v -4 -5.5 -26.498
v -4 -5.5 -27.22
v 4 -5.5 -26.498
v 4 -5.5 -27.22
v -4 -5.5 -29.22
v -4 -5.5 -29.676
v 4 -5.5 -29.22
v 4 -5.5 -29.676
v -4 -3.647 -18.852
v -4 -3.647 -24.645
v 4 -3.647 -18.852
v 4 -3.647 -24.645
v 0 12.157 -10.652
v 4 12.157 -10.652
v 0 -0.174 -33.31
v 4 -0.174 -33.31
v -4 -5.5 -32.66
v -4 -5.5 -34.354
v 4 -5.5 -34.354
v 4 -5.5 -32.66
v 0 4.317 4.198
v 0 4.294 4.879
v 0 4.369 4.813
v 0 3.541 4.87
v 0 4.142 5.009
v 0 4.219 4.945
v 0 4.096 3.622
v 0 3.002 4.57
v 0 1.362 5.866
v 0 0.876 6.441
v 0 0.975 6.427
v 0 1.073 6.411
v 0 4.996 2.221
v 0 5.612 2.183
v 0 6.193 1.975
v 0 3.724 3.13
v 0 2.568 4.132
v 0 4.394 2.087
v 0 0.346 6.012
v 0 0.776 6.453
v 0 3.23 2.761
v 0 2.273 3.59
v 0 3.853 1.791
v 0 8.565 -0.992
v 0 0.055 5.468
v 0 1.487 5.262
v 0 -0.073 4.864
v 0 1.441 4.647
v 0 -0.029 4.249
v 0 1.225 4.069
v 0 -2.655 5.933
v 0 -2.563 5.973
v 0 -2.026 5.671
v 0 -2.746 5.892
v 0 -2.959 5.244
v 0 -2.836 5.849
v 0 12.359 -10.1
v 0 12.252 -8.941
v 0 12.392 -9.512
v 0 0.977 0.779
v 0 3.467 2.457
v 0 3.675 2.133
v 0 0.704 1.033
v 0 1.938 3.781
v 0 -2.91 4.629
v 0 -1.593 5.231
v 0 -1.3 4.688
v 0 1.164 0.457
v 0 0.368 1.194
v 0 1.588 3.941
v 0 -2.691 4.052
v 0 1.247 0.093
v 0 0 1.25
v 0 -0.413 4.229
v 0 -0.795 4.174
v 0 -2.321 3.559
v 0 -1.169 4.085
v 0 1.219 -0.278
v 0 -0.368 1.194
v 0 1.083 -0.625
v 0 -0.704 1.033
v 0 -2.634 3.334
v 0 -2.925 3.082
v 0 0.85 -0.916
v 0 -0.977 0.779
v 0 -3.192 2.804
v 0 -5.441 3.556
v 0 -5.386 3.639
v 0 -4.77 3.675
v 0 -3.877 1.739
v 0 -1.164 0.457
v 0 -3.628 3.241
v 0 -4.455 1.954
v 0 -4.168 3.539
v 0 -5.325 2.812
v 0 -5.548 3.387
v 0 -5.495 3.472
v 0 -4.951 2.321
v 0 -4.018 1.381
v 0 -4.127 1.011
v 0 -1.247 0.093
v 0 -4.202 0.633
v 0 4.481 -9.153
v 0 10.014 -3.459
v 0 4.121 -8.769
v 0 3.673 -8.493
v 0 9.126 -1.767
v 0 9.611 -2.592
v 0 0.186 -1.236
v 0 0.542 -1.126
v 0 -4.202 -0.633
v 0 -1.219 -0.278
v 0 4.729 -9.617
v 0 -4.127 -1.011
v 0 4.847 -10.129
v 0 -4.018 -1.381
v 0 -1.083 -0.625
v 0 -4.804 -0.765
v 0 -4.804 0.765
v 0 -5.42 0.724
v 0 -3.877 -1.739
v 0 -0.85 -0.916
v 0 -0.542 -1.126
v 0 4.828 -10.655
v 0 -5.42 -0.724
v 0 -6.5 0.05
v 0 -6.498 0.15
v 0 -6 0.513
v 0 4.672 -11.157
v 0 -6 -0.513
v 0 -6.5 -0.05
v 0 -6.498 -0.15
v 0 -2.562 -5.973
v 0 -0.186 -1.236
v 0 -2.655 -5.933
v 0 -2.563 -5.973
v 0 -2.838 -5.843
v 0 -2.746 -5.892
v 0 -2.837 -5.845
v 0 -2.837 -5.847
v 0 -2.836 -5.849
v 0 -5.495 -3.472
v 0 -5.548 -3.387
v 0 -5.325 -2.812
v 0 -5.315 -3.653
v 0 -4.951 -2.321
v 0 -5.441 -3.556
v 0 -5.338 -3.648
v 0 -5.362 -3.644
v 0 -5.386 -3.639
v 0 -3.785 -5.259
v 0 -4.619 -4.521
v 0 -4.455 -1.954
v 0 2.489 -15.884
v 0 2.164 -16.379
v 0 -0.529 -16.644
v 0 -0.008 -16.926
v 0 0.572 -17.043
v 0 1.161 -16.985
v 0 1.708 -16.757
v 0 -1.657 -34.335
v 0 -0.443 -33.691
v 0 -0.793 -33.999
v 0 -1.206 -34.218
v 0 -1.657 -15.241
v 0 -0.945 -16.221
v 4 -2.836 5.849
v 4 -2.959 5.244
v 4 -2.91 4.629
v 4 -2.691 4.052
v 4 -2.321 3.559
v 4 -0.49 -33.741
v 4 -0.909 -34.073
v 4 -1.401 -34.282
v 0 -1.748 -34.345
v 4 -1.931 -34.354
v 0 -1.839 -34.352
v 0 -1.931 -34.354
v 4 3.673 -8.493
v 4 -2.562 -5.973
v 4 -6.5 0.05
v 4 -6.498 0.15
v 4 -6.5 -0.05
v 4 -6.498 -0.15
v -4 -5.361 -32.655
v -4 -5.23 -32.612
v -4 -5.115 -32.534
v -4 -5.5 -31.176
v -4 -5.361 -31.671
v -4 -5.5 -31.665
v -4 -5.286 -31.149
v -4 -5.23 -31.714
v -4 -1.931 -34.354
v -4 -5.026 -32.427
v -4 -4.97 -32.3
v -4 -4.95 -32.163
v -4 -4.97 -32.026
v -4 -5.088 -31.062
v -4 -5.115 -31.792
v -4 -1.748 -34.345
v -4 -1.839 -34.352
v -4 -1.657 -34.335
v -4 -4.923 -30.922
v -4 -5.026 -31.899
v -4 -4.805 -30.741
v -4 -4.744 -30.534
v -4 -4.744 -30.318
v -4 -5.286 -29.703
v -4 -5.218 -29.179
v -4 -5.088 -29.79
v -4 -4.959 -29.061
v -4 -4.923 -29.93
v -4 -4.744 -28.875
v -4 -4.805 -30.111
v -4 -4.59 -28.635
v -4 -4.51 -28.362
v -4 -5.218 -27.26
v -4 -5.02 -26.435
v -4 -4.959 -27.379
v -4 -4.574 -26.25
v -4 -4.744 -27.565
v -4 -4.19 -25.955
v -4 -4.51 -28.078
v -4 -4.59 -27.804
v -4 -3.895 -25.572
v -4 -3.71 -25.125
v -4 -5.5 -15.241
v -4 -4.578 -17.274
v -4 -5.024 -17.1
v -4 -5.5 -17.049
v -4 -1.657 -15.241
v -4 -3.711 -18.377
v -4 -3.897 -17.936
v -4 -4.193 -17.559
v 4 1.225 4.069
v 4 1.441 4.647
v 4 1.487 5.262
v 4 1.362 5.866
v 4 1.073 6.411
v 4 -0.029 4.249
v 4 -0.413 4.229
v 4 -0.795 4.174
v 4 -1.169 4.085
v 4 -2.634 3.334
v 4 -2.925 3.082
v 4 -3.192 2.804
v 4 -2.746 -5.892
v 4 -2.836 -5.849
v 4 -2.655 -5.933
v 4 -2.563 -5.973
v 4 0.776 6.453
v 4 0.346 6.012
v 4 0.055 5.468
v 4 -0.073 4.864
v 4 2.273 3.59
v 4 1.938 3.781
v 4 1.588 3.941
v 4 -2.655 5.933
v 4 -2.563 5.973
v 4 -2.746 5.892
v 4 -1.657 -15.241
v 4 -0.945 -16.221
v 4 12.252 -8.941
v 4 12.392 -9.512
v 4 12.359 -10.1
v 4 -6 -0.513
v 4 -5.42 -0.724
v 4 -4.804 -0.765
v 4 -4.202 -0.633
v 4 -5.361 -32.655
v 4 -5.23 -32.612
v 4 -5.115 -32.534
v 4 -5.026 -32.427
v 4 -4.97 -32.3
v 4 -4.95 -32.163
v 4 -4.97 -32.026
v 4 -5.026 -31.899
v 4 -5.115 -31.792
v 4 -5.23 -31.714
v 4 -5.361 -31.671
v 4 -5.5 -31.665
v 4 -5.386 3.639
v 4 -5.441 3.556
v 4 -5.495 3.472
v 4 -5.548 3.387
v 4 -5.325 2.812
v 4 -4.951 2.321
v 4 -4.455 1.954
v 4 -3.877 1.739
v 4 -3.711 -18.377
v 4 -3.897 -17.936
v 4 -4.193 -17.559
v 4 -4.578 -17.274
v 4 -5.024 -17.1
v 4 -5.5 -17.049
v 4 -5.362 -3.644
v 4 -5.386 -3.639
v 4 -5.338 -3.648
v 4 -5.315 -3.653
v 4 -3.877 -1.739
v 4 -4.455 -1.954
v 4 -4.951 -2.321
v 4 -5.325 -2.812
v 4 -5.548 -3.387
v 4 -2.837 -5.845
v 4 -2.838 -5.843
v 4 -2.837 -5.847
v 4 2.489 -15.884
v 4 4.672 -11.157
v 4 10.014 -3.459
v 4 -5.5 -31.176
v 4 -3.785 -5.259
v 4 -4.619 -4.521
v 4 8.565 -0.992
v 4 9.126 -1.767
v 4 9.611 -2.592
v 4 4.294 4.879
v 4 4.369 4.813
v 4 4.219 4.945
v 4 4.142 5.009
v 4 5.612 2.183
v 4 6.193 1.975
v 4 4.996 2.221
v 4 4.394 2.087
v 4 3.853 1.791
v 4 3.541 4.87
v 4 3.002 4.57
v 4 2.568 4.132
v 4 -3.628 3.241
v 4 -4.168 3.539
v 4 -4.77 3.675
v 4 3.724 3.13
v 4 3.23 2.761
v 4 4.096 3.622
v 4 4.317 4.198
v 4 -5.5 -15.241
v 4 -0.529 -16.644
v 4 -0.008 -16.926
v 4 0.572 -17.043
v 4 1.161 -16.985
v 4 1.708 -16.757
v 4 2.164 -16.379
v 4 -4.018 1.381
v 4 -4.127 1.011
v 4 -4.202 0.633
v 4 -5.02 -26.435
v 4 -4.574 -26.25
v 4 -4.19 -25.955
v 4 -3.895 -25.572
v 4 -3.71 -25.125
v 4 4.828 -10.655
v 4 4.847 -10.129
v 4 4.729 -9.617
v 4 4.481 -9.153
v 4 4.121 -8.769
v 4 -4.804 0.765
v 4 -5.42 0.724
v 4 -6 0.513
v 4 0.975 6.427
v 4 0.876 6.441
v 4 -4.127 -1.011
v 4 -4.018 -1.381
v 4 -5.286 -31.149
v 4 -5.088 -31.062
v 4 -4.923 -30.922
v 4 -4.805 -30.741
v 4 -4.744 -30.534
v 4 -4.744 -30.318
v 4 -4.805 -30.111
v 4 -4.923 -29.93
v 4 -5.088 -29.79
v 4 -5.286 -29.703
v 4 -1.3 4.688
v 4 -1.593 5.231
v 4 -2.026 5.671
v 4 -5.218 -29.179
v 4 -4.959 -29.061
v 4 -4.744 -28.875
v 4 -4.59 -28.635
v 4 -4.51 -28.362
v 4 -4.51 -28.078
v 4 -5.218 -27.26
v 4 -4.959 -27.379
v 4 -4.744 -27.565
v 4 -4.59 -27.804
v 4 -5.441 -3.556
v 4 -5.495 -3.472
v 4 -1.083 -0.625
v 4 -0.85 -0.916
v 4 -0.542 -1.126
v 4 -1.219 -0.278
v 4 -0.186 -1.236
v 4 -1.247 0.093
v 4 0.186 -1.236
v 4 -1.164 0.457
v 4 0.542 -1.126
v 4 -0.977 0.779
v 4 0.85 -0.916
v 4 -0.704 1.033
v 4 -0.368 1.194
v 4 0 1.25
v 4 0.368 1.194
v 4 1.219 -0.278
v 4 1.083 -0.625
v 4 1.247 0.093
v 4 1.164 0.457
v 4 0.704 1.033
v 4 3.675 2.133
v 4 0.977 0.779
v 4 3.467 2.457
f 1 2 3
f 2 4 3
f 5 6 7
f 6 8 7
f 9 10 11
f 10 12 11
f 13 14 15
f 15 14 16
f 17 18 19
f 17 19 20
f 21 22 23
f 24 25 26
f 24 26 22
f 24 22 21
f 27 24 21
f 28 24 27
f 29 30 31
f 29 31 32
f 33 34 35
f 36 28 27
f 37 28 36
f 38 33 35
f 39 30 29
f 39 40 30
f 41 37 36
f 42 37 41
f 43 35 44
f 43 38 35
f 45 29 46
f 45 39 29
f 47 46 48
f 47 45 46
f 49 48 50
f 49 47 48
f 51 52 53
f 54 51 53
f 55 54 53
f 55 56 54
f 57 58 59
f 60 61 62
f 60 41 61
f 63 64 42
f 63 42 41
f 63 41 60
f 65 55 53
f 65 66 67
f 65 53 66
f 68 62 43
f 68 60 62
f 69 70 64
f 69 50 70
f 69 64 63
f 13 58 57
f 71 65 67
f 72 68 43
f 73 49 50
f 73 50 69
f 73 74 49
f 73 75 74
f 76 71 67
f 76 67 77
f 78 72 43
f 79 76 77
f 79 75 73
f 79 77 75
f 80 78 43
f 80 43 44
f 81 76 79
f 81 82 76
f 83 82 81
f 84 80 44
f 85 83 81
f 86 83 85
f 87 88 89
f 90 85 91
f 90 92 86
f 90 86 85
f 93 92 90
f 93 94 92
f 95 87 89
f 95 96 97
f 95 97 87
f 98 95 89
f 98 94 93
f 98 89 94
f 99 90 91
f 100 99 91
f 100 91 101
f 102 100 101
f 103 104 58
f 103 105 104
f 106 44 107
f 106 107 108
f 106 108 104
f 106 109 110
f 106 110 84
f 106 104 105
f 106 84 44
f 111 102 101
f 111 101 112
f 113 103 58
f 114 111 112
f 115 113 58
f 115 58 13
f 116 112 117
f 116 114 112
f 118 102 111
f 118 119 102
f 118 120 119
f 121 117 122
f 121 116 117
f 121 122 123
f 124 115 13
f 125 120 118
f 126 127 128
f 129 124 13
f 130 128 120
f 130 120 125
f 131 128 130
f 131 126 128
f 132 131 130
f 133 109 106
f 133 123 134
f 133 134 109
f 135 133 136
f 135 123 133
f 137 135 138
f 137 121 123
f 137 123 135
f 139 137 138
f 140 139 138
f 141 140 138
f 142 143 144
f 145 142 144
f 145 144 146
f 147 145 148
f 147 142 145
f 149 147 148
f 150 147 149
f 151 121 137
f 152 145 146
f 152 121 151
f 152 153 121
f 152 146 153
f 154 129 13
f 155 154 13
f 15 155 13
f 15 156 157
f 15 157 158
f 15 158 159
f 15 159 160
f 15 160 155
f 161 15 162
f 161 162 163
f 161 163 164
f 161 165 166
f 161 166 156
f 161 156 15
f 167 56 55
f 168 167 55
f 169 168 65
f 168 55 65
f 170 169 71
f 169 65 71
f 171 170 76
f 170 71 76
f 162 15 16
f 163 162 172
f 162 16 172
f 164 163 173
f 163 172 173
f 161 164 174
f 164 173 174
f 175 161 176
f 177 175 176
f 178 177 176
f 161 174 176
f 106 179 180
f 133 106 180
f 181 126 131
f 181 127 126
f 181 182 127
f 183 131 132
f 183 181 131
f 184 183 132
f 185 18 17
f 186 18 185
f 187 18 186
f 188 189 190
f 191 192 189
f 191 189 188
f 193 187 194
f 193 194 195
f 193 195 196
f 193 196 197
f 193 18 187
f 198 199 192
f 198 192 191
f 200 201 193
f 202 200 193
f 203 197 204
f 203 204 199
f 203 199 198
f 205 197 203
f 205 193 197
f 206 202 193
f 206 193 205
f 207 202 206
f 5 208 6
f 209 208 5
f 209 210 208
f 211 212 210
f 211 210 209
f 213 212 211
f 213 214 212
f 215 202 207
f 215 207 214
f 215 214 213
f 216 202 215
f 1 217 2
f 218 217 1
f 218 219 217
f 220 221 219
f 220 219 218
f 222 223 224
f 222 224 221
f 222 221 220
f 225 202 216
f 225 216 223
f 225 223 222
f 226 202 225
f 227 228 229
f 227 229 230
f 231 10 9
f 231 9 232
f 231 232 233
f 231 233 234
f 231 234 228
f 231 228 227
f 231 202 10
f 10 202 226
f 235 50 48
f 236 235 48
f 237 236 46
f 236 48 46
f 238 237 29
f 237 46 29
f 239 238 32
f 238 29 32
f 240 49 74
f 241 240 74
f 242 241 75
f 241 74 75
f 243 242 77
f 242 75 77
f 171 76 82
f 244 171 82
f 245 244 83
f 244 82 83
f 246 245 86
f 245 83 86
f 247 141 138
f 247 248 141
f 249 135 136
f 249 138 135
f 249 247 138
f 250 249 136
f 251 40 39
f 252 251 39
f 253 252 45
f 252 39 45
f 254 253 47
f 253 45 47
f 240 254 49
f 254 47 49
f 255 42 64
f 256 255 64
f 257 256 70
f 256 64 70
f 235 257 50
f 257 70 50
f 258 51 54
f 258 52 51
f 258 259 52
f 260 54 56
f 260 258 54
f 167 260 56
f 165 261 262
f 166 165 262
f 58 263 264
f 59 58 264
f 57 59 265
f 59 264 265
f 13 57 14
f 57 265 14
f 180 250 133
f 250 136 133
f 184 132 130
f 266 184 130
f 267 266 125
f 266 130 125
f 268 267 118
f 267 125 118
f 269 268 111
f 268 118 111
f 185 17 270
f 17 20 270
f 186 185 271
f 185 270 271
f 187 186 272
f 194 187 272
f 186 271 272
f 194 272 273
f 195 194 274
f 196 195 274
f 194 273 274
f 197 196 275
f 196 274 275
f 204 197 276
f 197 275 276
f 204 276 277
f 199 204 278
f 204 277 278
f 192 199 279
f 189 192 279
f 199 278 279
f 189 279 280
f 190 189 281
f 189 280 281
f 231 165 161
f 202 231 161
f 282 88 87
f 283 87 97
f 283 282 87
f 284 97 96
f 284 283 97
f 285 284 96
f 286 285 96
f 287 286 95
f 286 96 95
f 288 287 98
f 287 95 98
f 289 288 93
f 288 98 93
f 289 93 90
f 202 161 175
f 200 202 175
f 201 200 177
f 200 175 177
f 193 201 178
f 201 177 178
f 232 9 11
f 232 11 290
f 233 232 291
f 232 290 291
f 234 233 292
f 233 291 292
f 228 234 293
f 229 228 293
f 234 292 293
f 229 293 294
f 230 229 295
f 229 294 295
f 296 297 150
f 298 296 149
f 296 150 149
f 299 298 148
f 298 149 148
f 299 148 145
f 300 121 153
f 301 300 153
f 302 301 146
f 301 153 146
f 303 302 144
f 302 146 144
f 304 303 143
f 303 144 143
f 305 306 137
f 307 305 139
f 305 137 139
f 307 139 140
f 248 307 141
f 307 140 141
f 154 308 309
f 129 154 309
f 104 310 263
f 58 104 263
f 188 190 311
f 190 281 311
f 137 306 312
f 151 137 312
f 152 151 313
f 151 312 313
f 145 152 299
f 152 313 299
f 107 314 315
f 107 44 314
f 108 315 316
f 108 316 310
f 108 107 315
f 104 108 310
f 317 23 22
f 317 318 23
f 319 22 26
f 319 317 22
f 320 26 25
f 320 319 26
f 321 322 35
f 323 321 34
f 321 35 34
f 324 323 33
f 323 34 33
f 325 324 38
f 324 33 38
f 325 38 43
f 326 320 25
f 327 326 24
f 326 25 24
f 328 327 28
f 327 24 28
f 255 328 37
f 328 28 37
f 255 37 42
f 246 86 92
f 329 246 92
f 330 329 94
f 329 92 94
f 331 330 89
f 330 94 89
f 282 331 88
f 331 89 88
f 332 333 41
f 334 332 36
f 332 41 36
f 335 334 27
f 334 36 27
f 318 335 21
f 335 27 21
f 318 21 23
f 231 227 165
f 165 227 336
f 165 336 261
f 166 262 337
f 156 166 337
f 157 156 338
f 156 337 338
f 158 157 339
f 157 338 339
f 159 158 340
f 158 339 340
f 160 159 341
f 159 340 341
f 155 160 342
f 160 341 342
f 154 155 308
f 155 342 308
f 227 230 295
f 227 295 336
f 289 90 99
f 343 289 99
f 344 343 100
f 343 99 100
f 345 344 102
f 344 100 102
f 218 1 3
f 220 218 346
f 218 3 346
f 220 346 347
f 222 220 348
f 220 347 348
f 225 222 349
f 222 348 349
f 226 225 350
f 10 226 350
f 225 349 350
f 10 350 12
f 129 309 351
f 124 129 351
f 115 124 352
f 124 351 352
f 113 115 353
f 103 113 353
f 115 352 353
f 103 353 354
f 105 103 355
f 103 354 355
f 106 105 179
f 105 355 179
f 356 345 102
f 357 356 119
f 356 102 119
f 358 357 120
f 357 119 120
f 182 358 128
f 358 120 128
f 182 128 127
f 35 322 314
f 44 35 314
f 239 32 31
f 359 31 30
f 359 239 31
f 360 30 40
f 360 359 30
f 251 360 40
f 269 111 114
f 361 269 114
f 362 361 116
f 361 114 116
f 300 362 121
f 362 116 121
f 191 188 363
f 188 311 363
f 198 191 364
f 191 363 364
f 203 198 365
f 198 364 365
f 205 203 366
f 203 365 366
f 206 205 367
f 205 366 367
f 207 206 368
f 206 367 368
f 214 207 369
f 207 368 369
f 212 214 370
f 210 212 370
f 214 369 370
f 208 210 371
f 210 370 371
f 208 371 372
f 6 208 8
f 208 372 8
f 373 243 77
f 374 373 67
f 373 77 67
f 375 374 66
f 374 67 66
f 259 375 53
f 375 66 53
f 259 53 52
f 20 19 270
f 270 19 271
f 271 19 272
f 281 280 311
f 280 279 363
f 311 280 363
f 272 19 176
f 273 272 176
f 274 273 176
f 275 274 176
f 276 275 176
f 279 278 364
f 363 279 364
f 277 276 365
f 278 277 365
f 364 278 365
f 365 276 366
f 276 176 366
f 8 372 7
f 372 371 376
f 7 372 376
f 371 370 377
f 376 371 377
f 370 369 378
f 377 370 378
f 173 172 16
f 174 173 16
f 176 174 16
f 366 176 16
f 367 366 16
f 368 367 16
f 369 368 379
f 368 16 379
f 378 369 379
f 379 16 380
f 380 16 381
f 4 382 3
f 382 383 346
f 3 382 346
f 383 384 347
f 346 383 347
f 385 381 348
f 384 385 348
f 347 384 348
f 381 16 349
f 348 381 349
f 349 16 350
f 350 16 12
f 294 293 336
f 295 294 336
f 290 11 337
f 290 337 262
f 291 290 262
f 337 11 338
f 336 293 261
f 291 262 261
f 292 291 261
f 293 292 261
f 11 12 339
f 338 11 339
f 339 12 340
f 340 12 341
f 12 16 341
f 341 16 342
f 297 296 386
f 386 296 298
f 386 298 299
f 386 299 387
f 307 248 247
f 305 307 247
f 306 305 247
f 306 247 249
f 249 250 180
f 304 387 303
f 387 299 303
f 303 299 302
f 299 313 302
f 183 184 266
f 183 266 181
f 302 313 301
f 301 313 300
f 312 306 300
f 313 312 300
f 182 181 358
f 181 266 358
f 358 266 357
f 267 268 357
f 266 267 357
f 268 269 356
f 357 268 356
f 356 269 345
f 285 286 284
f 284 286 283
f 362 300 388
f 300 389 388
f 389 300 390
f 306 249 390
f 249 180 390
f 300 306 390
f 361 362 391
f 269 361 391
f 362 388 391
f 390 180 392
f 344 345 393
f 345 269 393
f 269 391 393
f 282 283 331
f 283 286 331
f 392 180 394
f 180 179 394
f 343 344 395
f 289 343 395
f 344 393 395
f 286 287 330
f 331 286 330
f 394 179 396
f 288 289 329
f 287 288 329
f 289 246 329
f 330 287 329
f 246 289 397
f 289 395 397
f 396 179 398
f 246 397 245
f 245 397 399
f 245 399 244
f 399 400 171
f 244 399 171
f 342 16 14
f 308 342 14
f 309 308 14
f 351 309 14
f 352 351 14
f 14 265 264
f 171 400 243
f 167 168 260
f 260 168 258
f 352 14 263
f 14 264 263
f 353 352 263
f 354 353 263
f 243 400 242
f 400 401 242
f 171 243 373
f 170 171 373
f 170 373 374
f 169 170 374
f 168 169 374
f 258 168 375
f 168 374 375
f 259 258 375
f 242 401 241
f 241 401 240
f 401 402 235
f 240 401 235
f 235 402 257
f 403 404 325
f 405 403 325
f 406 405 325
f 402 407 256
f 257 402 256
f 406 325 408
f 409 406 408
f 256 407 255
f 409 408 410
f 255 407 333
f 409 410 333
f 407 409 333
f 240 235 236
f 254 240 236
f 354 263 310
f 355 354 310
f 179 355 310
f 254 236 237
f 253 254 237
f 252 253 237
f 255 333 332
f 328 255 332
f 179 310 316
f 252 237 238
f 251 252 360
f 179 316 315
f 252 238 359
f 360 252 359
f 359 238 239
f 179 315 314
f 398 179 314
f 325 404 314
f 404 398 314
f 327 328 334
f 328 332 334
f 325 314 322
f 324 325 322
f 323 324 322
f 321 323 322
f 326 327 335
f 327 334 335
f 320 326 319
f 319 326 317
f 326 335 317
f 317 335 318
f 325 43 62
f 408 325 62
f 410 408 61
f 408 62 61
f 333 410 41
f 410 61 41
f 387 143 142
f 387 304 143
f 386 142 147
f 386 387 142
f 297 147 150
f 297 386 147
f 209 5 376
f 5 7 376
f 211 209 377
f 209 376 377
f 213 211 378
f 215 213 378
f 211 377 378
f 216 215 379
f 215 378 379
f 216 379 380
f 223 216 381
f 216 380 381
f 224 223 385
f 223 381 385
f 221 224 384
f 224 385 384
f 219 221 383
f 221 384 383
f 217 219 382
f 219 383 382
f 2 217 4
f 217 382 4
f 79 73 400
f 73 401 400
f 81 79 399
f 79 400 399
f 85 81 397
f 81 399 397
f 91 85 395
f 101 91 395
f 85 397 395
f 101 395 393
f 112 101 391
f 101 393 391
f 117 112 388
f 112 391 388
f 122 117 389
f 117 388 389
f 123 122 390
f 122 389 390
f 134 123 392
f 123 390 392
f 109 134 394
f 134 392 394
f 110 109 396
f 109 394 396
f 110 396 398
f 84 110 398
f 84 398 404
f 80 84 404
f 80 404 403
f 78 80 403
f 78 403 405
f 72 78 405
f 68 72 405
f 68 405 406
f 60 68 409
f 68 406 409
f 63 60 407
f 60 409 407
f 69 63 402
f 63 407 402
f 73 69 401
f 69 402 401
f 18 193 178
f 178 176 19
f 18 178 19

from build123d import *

# Parameters (mm, degrees)
BASPROSKE_W                 = 4
BASPROSKE_H                 = 6.5
TOOTHCUT_DEPTH              = 11.024968828
TEETHCUTS_COUNT             = 11
TEETHCUTS_ANGLE             = 327.272727273
BORSKE_R                    = 1.25
BORE_DEPTH                  = 62.5000635
Y_KSEKLIK_EKSTR_ZYON1_DEPTH = 4
Y_KSEKLIK_EKSTR_ZYON2_DEPTH = 4
RADYUS1_R                   = 10


with BuildPart() as part:
    # BasProSke → Base-Revolve (revolve)
    with BuildSketch(Plane(origin=(0, 0, 0), x_dir=(1, 0, 0), z_dir=(0, 1, 0)), mode=Mode.PRIVATE) as base_revolve_sk:
        with Locations((2, 3.25)):
            Rectangle(BASPROSKE_W, BASPROSKE_H)
    revolve(base_revolve_sk.sketch.rotate(Axis((-10, 0, 0), (1, 0, 0)), 180), axis=Axis((-10, 0, 0), (1, 0, 0)))

    # TooCutSke → ToothCut (cut, through all)
    with BuildSketch(Plane(origin=(0, 0, 0), x_dir=(0, 0, -1), z_dir=(1, 0, 0))):
        with BuildLine():
            ThreePointArc((0.576045815, 4.209771041), (0, 4.249), (-0.576045815, 4.209771041))
            ThreePointArc((-0.576045815, 4.209771041), (-0.841371334, 5.420048739), (-1.718652745, 6.295004202))
            ThreePointArc((-1.718652745, 6.295004202), (0, 6.5254), (1.718652745, 6.295004202))
            ThreePointArc((1.718652745, 6.295004202), (0.841371334, 5.420048739), (0.576045815, 4.209771041))
        make_face()
    toothcut = extrude(amount=TOOTHCUT_DEPTH, mode=Mode.SUBTRACT)

    # TeethCuts: ToothCut ×11 about axis
    teethcuts_axis = Axis((-10, 0, 0), (1, 0, 0))
    for i in range(1, TEETHCUTS_COUNT):
        add(toothcut.rotate(teethcuts_axis, i * TEETHCUTS_ANGLE / (TEETHCUTS_COUNT - 1)), mode=Mode.SUBTRACT)

    # BorSke → Bore (cut, symmetric)
    with BuildSketch(Plane(origin=(0, 0, 0), x_dir=(0, 0, -1), z_dir=(1, 0, 0))):
        with Locations(Location((0, 0, 0), (0, 0, 180))):
            Circle(BORSKE_R)
    extrude(amount=BORE_DEPTH, both=True, mode=Mode.SUBTRACT)

    # Çizim1 → Yükseklik-Ekstrüzyon1 (add)
    with BuildSketch(Plane(origin=(4, 0, 0), x_dir=(0, 0, -1), z_dir=(1, 0, 0))):
        with BuildLine():
            Line((2.760779628, -3.22987567), (1.236039076, 1.290267465))
            Line((1.236039076, 1.290267465), (-1.738987524, 3.876844515))
            ThreePointArc((-1.738987524, 3.876844515), (-2.188277705, 5.001068805), (-1.97474715, 6.192767854))
            Line((-1.97474715, 6.192767854), (2.120750073, 9.468090654))
            Line((2.120750073, 9.468090654), (8.9405865, 12.251804864))
            ThreePointArc((8.9405865, 12.251804864), (9.807212476, 12.397047884), (10.652448939, 12.156815828))
            Line((10.652448939, 12.156815828), (33.309678392, -0.173886099))
            ThreePointArc((33.309678392, -0.173886099), (34.072949781, -0.908840205), (34.353634969, -1.930582137))
            Line((34.353634969, -1.930582137), (34.353634969, -5.5))
            Line((34.353634969, -5.5), (32.660479675, -5.5))
            ThreePointArc((32.660479675, -5.5), (32.162954251, -4.950316473), (31.665428827, -5.5))
            Line((31.665428827, -5.5), (31.175724059, -5.5))
            ThreePointArc((31.175724059, -5.5), (30.425852071, -4.73614356), (29.675980082, -5.5))
            Line((29.675980082, -5.5), (29.219830425, -5.5))
            ThreePointArc((29.219830425, -5.5), (28.219830425, -4.5), (27.219830425, -5.5))
            Line((27.219830425, -5.5), (26.498039052, -5.5))
            ThreePointArc((26.498039052, -5.5), (25.955354116, -4.189842668), (24.645196784, -3.647157732))
            Line((24.645196784, -3.647157732), (18.851825021, -3.647157732))
            ThreePointArc((18.851825021, -3.647157732), (17.559352829, -4.192979175), (17.049350889, -5.5))
            Line((17.049350889, -5.5), (15.2413188, -5.5))
            Line((15.2413188, -5.5), (15.2413188, -1.657187873))
            Line((15.2413188, -1.657187873), (16.22148633, -0.944515231))
            ThreePointArc((16.22148633, -0.944515231), (17.0357361, 0.868792159), (15.883922648, 2.488795908))
            Line((15.883922648, 2.488795908), (11.157138105, 4.671882096))
            ThreePointArc((11.157138105, 4.671882096), (9.616505575, 4.728916331), (8.493027441, 3.673170916))
            Line((8.493027441, 3.673170916), (5.962652768, -2.587812197))
            ThreePointArc((5.962652768, -2.587812197), (4.998691965, -4.113179975), (3.652524478, -5.314762425))
            ThreePointArc((3.652524478, -5.314762425), (2.917345271, -4.39606094), (2.760779628, -3.22987567))
        make_face()
    extrude(amount=-Y_KSEKLIK_EKSTR_ZYON1_DEPTH)

    # Çizim2 → Yükseklik-Ekstrüzyon2 (add)
    with BuildSketch(Plane.ZY):
        with BuildLine():
            Line((-34.353634969, -1.930582137), (-34.353634969, -5.5))
            Line((-34.353634969, -5.5), (-32.660479675, -5.5))
            ThreePointArc((-32.660479675, -5.5), (-32.162954251, -4.950316473), (-31.665428827, -5.5))
            Line((-31.665428827, -5.5), (-31.175724059, -5.5))
            ThreePointArc((-31.175724059, -5.5), (-30.425852071, -4.73614356), (-29.675980082, -5.5))
            Line((-29.675980082, -5.5), (-29.219830425, -5.5))
            ThreePointArc((-29.219830425, -5.5), (-28.219830425, -4.5), (-27.219830425, -5.5))
            Line((-27.219830425, -5.5), (-26.498039052, -5.5))
            ThreePointArc((-26.498039052, -5.5), (-25.955354116, -4.189842668), (-24.645196784, -3.647157732))
            Line((-24.645196784, -3.647157732), (-18.851825021, -3.647157732))
            ThreePointArc((-18.851825021, -3.647157732), (-17.559352829, -4.192979175), (-17.049350889, -5.5))
            Line((-17.049350889, -5.5), (-15.2413188, -5.5))
            Line((-15.2413188, -5.5), (-15.2413188, -1.657187873))
            Line((-15.2413188, -1.657187873), (-34.334860745, -1.657187873))
            ThreePointArc((-34.334860745, -1.657187873), (-34.348935892, -1.793563074), (-34.353634969, -1.930582137))
        make_face()
    extrude(amount=Y_KSEKLIK_EKSTR_ZYON2_DEPTH)

    # Radyus1
    radyus1_edges = [part.edges().sort_by_distance(p)[0] for p in [
        (2, 9.468090654, -2.120750073),
    ]]
    fillet(radyus1_edges, radius=RADYUS1_R)


solid = part.part
